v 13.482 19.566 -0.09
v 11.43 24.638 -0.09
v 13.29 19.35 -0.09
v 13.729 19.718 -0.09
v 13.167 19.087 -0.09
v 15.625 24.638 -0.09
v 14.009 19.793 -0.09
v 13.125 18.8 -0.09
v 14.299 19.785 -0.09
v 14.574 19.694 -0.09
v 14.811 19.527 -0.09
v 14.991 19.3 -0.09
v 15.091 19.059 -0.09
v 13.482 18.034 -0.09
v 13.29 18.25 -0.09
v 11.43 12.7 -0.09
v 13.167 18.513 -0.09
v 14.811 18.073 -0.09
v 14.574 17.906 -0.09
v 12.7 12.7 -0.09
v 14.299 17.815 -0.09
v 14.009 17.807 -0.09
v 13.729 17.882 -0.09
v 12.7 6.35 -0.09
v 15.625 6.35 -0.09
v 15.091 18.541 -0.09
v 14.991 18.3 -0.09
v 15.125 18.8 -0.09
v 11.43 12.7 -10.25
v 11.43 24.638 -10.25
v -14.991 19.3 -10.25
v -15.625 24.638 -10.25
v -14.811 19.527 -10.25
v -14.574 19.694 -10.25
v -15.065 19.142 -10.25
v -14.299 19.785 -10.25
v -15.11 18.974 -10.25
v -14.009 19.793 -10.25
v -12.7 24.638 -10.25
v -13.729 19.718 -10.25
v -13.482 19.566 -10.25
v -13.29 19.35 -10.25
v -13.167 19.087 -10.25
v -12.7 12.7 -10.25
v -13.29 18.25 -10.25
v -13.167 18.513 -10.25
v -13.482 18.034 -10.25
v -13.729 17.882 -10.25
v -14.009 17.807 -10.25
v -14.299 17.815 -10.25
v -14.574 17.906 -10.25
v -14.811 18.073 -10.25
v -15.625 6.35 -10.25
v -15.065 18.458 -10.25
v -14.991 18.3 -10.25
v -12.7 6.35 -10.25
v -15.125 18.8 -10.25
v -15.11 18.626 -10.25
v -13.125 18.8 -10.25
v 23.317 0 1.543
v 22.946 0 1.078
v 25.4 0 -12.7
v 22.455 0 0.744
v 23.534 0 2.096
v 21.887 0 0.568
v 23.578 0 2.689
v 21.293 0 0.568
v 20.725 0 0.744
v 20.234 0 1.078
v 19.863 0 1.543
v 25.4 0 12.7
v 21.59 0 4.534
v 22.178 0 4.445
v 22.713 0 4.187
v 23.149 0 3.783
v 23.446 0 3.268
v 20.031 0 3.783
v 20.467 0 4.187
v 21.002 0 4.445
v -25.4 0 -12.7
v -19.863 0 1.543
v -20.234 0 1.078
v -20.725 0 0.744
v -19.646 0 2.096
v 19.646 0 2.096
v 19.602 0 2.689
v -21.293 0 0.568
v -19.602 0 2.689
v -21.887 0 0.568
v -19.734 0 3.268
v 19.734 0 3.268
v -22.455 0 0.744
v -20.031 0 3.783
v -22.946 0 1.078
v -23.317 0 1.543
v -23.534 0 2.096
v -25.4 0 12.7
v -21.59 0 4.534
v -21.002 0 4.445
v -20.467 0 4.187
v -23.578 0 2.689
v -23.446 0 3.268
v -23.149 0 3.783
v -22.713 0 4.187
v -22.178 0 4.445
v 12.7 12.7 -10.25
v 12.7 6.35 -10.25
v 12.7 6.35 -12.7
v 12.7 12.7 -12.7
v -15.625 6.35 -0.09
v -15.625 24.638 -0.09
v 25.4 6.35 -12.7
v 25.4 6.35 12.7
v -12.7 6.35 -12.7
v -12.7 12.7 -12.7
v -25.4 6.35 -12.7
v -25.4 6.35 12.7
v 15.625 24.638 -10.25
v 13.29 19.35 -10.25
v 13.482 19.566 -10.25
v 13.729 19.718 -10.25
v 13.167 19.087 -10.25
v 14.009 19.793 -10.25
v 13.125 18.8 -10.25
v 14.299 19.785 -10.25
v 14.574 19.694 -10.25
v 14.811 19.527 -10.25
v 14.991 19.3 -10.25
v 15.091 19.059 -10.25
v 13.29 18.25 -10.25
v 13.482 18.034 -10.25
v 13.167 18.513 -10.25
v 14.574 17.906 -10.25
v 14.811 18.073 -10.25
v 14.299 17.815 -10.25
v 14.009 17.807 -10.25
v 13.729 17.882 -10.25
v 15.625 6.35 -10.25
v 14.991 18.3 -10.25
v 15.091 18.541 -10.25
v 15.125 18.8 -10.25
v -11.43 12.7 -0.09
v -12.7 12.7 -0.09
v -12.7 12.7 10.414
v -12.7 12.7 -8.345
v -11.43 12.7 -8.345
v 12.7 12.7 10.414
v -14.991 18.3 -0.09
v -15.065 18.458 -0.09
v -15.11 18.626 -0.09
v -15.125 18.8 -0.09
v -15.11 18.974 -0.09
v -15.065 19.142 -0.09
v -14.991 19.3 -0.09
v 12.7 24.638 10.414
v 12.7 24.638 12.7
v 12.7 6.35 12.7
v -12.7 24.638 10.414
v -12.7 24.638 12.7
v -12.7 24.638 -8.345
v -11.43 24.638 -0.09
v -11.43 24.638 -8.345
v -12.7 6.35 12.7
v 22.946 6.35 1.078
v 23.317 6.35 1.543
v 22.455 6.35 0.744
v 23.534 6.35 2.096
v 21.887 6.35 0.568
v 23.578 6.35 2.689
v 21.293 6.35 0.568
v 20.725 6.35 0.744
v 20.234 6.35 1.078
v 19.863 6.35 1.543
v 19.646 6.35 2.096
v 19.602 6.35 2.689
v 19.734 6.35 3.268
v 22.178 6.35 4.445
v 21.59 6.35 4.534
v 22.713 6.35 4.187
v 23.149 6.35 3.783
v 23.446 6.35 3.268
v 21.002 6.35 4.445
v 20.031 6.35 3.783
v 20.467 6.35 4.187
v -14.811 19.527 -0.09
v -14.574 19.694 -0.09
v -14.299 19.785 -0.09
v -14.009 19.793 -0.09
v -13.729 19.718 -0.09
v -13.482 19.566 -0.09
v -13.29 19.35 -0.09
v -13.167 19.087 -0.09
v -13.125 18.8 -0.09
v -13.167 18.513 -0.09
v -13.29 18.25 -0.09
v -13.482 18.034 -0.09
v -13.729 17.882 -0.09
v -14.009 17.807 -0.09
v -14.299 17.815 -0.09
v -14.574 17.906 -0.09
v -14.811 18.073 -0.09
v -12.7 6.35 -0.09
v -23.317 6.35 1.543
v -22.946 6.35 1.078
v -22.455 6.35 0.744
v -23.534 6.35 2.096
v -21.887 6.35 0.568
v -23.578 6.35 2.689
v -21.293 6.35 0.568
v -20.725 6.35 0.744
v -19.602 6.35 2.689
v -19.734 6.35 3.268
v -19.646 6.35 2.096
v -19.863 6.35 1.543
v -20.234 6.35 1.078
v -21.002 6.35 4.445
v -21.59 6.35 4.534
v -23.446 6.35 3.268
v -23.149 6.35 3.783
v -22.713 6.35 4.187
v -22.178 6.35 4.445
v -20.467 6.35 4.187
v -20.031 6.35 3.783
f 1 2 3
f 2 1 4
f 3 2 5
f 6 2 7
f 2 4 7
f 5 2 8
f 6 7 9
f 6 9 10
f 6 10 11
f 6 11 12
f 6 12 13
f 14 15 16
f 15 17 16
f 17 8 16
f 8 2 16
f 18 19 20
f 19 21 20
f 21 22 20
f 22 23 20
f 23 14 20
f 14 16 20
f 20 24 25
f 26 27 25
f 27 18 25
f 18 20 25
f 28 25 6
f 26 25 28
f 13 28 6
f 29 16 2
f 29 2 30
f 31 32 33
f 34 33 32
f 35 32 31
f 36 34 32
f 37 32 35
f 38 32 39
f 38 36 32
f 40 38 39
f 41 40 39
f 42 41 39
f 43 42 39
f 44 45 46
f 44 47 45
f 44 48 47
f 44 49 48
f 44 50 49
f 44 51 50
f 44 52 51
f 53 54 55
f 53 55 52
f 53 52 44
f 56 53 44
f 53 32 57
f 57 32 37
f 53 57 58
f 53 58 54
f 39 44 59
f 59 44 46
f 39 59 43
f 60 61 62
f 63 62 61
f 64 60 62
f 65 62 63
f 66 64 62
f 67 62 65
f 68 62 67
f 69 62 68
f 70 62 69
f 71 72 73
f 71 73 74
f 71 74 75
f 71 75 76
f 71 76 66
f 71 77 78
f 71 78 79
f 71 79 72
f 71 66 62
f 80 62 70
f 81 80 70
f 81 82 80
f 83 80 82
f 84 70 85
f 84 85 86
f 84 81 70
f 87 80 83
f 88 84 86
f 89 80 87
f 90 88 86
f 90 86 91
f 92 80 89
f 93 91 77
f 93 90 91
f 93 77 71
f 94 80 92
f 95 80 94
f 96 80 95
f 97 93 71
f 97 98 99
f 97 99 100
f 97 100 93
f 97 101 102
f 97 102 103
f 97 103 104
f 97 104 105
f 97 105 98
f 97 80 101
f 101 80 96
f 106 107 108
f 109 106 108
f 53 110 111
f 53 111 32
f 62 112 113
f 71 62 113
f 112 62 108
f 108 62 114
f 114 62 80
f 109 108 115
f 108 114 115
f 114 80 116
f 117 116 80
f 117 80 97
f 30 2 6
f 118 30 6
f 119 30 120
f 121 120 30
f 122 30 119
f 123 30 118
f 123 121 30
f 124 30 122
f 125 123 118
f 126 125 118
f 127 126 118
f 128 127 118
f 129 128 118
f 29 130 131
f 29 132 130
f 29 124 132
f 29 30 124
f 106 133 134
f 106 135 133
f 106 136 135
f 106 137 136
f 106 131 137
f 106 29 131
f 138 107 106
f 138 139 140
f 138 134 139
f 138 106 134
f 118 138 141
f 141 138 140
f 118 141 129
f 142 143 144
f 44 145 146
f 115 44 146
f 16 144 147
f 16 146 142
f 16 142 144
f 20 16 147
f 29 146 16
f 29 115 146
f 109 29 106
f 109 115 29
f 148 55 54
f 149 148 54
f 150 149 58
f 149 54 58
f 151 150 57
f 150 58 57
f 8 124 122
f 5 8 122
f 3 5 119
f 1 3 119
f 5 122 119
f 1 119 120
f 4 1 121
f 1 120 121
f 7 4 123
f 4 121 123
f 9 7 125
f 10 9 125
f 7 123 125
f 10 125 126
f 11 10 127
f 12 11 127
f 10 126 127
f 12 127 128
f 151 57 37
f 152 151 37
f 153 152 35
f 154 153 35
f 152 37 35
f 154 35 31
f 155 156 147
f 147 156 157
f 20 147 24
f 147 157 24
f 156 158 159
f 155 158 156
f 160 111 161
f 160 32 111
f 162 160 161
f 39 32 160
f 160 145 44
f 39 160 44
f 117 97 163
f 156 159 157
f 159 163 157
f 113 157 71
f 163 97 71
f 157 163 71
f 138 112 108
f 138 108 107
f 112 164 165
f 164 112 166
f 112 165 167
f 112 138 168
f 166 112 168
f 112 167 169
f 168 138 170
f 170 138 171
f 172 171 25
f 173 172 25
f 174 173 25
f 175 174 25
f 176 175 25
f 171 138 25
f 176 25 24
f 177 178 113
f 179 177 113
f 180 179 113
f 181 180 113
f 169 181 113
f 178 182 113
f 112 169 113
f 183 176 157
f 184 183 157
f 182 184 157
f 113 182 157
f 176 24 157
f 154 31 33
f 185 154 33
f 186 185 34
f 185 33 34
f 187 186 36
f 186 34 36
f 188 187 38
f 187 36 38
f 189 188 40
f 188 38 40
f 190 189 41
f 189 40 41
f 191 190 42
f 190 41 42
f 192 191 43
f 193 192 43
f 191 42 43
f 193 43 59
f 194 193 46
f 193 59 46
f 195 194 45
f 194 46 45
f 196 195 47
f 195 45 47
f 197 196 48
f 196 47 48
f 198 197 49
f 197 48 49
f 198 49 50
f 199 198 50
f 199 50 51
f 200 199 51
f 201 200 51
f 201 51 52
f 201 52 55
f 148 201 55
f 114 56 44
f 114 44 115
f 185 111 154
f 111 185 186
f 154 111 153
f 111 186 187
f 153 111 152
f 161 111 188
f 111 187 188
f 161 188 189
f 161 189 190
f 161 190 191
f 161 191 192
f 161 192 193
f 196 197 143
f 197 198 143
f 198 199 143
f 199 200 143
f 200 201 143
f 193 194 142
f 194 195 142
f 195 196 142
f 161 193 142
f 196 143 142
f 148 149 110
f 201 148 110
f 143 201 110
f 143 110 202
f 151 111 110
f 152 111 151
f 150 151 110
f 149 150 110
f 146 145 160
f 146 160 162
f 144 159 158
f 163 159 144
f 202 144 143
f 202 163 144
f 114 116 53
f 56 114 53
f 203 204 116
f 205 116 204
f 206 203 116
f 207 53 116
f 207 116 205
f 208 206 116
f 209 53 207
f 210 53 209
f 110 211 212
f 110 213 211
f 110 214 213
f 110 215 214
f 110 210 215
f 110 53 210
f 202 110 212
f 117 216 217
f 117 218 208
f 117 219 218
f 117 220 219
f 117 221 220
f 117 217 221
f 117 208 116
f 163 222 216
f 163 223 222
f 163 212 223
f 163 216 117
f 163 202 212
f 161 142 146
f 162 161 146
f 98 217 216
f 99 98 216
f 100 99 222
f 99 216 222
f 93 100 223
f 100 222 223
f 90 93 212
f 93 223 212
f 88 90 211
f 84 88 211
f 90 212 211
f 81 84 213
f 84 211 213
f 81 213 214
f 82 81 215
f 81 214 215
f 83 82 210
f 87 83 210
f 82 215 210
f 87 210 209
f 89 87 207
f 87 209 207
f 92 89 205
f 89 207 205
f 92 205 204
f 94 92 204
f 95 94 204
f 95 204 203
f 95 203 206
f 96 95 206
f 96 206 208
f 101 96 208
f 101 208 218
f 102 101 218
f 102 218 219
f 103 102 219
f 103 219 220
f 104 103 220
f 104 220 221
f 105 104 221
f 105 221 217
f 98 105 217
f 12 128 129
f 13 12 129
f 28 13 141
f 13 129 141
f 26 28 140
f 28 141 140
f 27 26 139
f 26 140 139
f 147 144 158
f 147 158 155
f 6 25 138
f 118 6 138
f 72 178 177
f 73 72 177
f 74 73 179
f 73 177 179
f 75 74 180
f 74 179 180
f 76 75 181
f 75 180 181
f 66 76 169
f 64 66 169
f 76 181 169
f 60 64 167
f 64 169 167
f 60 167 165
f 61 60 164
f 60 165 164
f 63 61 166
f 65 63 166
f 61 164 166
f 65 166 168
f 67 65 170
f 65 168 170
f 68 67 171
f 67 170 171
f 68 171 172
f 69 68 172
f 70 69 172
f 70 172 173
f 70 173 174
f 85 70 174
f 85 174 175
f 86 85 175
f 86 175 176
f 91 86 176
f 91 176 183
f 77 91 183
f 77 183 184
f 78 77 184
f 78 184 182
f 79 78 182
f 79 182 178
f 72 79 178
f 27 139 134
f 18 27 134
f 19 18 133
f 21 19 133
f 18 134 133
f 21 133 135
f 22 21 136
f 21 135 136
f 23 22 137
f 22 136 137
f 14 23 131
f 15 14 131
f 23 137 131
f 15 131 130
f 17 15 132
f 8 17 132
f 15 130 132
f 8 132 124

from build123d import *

# Parameters (mm, degrees)
SKETCH1_W           = 25.4
SKETCH1_H           = 25.4
BOSS_EXTRUDE1_DEPTH = 12.7
SKETCH2_W           = 25.4
SKETCH2_H           = 6.35
BOSS_EXTRUDE2_DEPTH = 12.7
SKETCH6_W           = 2.925
SKETCH6_H           = 10.16
BOSS_EXTRUDE3_DEPTH = 18.288
SKETCH8_W           = 1.27
SKETCH8_H           = 8.255
SKETCH8_H_2         = 10.16
BOSS_EXTRUDE4_DEPTH = 11.938
SKETCH9_W           = 25.4
SKETCH9_H           = 2.286
BOSS_EXTRUDE5_DEPTH = 11.938
SKETCH10_R          = 1.9939
CUT_EXTRUDE1_DEPTH  = 34.777225226
CUT_EXTRUDE2_DEPTH  = 43.17693142


with BuildPart() as part:
    # Sketch1 → Boss-Extrude1 (new body)
    with BuildSketch(Plane(origin=(0, 0, 0), x_dir=(1, 0, 0), z_dir=(0, 1, 0))):
        Rectangle(SKETCH1_W, SKETCH1_H)
    extrude(amount=BOSS_EXTRUDE1_DEPTH)

    # Sketch2 → Boss-Extrude2 (add)
    with BuildSketch(Plane.ZY.offset(12.7)):
        with Locations((0, 3.175)):
            Rectangle(SKETCH2_W, SKETCH2_H)
    boss_extrude2 = extrude(amount=BOSS_EXTRUDE2_DEPTH)

    # Mirror1: Boss-Extrude2 across plane
    add(boss_extrude2.mirror(Plane(origin=(0, 0, 0), x_dir=(0, 0, 1), z_dir=(1, 0, 0))))

    # Sketch6 → Boss-Extrude3 (add)
    with BuildSketch(Plane(origin=(0, 6.35, 0), x_dir=(1, 0, 0), z_dir=(0, 1, 0))):
        with Locations((-14.1625, 5.17)):
            Rectangle(SKETCH6_W, SKETCH6_H)
        with Locations((14.1625, 5.17)):
            Rectangle(SKETCH6_W, SKETCH6_H)
    extrude(amount=BOSS_EXTRUDE3_DEPTH)

    # Sketch8 → Boss-Extrude4 (add)
    with BuildSketch(Plane(origin=(0, 12.7, 0), x_dir=(1, 0, 0), z_dir=(0, 1, 0))):
        with Locations((-12.065, 4.2175)):
            Rectangle(SKETCH8_W, SKETCH8_H)
        with Locations((12.065, 5.17)):
            Rectangle(SKETCH8_W, SKETCH8_H_2)
    extrude(amount=BOSS_EXTRUDE4_DEPTH)

    # Sketch9 → Boss-Extrude5 (add)
    with BuildSketch(Plane(origin=(0, 12.7, 0), x_dir=(1, 0, 0), z_dir=(0, 1, 0))):
        with Locations((0, -11.557)):
            Rectangle(SKETCH9_W, SKETCH9_H)
    extrude(amount=BOSS_EXTRUDE5_DEPTH)

    # Sketch10 → Cut-Extrude1 (cut, through all)
    with BuildSketch(Plane(origin=(0, 6.35, 0), x_dir=(1, 0, 0), z_dir=(0, 1, 0))):
        with Locations(Location((21.59, -2.54, 0), (0, 0, 270))):
            Circle(SKETCH10_R)
        with Locations(Location((-21.59, -2.54, 0), (0, 0, 270))):
            Circle(SKETCH10_R)
    extrude(amount=-CUT_EXTRUDE1_DEPTH, mode=Mode.SUBTRACT)

    # Sketch11 → Cut-Extrude2 (cut, through all)
    with BuildSketch(Plane(origin=(0, 0, -10.25), x_dir=(-1, 0, 0), z_dir=(0, 0, -1))):
        with BuildLine():
            ThreePointArc((15.125, 18.8), (15.090925826, 19.058819045), (14.991025404, 19.3))
            ThreePointArc((14.991025404, 19.3), (13.125, 18.8), (14.991025404, 18.3))
            ThreePointArc((14.991025404, 18.3), (15.090925826, 18.541180955), (15.125, 18.8))
        make_face()
        with BuildLine():
            ThreePointArc((-14.991025404, 19.3), (-15.125, 18.8), (-14.991025404, 18.3))
            ThreePointArc((-14.991025404, 18.3), (-13.866180955, 17.834074174), (-13.125, 18.8))
            ThreePointArc((-13.125, 18.8), (-13.866180955, 19.765925826), (-14.991025404, 19.3))
        make_face()
    extrude(amount=-CUT_EXTRUDE2_DEPTH, mode=Mode.SUBTRACT)


solid = part.part
